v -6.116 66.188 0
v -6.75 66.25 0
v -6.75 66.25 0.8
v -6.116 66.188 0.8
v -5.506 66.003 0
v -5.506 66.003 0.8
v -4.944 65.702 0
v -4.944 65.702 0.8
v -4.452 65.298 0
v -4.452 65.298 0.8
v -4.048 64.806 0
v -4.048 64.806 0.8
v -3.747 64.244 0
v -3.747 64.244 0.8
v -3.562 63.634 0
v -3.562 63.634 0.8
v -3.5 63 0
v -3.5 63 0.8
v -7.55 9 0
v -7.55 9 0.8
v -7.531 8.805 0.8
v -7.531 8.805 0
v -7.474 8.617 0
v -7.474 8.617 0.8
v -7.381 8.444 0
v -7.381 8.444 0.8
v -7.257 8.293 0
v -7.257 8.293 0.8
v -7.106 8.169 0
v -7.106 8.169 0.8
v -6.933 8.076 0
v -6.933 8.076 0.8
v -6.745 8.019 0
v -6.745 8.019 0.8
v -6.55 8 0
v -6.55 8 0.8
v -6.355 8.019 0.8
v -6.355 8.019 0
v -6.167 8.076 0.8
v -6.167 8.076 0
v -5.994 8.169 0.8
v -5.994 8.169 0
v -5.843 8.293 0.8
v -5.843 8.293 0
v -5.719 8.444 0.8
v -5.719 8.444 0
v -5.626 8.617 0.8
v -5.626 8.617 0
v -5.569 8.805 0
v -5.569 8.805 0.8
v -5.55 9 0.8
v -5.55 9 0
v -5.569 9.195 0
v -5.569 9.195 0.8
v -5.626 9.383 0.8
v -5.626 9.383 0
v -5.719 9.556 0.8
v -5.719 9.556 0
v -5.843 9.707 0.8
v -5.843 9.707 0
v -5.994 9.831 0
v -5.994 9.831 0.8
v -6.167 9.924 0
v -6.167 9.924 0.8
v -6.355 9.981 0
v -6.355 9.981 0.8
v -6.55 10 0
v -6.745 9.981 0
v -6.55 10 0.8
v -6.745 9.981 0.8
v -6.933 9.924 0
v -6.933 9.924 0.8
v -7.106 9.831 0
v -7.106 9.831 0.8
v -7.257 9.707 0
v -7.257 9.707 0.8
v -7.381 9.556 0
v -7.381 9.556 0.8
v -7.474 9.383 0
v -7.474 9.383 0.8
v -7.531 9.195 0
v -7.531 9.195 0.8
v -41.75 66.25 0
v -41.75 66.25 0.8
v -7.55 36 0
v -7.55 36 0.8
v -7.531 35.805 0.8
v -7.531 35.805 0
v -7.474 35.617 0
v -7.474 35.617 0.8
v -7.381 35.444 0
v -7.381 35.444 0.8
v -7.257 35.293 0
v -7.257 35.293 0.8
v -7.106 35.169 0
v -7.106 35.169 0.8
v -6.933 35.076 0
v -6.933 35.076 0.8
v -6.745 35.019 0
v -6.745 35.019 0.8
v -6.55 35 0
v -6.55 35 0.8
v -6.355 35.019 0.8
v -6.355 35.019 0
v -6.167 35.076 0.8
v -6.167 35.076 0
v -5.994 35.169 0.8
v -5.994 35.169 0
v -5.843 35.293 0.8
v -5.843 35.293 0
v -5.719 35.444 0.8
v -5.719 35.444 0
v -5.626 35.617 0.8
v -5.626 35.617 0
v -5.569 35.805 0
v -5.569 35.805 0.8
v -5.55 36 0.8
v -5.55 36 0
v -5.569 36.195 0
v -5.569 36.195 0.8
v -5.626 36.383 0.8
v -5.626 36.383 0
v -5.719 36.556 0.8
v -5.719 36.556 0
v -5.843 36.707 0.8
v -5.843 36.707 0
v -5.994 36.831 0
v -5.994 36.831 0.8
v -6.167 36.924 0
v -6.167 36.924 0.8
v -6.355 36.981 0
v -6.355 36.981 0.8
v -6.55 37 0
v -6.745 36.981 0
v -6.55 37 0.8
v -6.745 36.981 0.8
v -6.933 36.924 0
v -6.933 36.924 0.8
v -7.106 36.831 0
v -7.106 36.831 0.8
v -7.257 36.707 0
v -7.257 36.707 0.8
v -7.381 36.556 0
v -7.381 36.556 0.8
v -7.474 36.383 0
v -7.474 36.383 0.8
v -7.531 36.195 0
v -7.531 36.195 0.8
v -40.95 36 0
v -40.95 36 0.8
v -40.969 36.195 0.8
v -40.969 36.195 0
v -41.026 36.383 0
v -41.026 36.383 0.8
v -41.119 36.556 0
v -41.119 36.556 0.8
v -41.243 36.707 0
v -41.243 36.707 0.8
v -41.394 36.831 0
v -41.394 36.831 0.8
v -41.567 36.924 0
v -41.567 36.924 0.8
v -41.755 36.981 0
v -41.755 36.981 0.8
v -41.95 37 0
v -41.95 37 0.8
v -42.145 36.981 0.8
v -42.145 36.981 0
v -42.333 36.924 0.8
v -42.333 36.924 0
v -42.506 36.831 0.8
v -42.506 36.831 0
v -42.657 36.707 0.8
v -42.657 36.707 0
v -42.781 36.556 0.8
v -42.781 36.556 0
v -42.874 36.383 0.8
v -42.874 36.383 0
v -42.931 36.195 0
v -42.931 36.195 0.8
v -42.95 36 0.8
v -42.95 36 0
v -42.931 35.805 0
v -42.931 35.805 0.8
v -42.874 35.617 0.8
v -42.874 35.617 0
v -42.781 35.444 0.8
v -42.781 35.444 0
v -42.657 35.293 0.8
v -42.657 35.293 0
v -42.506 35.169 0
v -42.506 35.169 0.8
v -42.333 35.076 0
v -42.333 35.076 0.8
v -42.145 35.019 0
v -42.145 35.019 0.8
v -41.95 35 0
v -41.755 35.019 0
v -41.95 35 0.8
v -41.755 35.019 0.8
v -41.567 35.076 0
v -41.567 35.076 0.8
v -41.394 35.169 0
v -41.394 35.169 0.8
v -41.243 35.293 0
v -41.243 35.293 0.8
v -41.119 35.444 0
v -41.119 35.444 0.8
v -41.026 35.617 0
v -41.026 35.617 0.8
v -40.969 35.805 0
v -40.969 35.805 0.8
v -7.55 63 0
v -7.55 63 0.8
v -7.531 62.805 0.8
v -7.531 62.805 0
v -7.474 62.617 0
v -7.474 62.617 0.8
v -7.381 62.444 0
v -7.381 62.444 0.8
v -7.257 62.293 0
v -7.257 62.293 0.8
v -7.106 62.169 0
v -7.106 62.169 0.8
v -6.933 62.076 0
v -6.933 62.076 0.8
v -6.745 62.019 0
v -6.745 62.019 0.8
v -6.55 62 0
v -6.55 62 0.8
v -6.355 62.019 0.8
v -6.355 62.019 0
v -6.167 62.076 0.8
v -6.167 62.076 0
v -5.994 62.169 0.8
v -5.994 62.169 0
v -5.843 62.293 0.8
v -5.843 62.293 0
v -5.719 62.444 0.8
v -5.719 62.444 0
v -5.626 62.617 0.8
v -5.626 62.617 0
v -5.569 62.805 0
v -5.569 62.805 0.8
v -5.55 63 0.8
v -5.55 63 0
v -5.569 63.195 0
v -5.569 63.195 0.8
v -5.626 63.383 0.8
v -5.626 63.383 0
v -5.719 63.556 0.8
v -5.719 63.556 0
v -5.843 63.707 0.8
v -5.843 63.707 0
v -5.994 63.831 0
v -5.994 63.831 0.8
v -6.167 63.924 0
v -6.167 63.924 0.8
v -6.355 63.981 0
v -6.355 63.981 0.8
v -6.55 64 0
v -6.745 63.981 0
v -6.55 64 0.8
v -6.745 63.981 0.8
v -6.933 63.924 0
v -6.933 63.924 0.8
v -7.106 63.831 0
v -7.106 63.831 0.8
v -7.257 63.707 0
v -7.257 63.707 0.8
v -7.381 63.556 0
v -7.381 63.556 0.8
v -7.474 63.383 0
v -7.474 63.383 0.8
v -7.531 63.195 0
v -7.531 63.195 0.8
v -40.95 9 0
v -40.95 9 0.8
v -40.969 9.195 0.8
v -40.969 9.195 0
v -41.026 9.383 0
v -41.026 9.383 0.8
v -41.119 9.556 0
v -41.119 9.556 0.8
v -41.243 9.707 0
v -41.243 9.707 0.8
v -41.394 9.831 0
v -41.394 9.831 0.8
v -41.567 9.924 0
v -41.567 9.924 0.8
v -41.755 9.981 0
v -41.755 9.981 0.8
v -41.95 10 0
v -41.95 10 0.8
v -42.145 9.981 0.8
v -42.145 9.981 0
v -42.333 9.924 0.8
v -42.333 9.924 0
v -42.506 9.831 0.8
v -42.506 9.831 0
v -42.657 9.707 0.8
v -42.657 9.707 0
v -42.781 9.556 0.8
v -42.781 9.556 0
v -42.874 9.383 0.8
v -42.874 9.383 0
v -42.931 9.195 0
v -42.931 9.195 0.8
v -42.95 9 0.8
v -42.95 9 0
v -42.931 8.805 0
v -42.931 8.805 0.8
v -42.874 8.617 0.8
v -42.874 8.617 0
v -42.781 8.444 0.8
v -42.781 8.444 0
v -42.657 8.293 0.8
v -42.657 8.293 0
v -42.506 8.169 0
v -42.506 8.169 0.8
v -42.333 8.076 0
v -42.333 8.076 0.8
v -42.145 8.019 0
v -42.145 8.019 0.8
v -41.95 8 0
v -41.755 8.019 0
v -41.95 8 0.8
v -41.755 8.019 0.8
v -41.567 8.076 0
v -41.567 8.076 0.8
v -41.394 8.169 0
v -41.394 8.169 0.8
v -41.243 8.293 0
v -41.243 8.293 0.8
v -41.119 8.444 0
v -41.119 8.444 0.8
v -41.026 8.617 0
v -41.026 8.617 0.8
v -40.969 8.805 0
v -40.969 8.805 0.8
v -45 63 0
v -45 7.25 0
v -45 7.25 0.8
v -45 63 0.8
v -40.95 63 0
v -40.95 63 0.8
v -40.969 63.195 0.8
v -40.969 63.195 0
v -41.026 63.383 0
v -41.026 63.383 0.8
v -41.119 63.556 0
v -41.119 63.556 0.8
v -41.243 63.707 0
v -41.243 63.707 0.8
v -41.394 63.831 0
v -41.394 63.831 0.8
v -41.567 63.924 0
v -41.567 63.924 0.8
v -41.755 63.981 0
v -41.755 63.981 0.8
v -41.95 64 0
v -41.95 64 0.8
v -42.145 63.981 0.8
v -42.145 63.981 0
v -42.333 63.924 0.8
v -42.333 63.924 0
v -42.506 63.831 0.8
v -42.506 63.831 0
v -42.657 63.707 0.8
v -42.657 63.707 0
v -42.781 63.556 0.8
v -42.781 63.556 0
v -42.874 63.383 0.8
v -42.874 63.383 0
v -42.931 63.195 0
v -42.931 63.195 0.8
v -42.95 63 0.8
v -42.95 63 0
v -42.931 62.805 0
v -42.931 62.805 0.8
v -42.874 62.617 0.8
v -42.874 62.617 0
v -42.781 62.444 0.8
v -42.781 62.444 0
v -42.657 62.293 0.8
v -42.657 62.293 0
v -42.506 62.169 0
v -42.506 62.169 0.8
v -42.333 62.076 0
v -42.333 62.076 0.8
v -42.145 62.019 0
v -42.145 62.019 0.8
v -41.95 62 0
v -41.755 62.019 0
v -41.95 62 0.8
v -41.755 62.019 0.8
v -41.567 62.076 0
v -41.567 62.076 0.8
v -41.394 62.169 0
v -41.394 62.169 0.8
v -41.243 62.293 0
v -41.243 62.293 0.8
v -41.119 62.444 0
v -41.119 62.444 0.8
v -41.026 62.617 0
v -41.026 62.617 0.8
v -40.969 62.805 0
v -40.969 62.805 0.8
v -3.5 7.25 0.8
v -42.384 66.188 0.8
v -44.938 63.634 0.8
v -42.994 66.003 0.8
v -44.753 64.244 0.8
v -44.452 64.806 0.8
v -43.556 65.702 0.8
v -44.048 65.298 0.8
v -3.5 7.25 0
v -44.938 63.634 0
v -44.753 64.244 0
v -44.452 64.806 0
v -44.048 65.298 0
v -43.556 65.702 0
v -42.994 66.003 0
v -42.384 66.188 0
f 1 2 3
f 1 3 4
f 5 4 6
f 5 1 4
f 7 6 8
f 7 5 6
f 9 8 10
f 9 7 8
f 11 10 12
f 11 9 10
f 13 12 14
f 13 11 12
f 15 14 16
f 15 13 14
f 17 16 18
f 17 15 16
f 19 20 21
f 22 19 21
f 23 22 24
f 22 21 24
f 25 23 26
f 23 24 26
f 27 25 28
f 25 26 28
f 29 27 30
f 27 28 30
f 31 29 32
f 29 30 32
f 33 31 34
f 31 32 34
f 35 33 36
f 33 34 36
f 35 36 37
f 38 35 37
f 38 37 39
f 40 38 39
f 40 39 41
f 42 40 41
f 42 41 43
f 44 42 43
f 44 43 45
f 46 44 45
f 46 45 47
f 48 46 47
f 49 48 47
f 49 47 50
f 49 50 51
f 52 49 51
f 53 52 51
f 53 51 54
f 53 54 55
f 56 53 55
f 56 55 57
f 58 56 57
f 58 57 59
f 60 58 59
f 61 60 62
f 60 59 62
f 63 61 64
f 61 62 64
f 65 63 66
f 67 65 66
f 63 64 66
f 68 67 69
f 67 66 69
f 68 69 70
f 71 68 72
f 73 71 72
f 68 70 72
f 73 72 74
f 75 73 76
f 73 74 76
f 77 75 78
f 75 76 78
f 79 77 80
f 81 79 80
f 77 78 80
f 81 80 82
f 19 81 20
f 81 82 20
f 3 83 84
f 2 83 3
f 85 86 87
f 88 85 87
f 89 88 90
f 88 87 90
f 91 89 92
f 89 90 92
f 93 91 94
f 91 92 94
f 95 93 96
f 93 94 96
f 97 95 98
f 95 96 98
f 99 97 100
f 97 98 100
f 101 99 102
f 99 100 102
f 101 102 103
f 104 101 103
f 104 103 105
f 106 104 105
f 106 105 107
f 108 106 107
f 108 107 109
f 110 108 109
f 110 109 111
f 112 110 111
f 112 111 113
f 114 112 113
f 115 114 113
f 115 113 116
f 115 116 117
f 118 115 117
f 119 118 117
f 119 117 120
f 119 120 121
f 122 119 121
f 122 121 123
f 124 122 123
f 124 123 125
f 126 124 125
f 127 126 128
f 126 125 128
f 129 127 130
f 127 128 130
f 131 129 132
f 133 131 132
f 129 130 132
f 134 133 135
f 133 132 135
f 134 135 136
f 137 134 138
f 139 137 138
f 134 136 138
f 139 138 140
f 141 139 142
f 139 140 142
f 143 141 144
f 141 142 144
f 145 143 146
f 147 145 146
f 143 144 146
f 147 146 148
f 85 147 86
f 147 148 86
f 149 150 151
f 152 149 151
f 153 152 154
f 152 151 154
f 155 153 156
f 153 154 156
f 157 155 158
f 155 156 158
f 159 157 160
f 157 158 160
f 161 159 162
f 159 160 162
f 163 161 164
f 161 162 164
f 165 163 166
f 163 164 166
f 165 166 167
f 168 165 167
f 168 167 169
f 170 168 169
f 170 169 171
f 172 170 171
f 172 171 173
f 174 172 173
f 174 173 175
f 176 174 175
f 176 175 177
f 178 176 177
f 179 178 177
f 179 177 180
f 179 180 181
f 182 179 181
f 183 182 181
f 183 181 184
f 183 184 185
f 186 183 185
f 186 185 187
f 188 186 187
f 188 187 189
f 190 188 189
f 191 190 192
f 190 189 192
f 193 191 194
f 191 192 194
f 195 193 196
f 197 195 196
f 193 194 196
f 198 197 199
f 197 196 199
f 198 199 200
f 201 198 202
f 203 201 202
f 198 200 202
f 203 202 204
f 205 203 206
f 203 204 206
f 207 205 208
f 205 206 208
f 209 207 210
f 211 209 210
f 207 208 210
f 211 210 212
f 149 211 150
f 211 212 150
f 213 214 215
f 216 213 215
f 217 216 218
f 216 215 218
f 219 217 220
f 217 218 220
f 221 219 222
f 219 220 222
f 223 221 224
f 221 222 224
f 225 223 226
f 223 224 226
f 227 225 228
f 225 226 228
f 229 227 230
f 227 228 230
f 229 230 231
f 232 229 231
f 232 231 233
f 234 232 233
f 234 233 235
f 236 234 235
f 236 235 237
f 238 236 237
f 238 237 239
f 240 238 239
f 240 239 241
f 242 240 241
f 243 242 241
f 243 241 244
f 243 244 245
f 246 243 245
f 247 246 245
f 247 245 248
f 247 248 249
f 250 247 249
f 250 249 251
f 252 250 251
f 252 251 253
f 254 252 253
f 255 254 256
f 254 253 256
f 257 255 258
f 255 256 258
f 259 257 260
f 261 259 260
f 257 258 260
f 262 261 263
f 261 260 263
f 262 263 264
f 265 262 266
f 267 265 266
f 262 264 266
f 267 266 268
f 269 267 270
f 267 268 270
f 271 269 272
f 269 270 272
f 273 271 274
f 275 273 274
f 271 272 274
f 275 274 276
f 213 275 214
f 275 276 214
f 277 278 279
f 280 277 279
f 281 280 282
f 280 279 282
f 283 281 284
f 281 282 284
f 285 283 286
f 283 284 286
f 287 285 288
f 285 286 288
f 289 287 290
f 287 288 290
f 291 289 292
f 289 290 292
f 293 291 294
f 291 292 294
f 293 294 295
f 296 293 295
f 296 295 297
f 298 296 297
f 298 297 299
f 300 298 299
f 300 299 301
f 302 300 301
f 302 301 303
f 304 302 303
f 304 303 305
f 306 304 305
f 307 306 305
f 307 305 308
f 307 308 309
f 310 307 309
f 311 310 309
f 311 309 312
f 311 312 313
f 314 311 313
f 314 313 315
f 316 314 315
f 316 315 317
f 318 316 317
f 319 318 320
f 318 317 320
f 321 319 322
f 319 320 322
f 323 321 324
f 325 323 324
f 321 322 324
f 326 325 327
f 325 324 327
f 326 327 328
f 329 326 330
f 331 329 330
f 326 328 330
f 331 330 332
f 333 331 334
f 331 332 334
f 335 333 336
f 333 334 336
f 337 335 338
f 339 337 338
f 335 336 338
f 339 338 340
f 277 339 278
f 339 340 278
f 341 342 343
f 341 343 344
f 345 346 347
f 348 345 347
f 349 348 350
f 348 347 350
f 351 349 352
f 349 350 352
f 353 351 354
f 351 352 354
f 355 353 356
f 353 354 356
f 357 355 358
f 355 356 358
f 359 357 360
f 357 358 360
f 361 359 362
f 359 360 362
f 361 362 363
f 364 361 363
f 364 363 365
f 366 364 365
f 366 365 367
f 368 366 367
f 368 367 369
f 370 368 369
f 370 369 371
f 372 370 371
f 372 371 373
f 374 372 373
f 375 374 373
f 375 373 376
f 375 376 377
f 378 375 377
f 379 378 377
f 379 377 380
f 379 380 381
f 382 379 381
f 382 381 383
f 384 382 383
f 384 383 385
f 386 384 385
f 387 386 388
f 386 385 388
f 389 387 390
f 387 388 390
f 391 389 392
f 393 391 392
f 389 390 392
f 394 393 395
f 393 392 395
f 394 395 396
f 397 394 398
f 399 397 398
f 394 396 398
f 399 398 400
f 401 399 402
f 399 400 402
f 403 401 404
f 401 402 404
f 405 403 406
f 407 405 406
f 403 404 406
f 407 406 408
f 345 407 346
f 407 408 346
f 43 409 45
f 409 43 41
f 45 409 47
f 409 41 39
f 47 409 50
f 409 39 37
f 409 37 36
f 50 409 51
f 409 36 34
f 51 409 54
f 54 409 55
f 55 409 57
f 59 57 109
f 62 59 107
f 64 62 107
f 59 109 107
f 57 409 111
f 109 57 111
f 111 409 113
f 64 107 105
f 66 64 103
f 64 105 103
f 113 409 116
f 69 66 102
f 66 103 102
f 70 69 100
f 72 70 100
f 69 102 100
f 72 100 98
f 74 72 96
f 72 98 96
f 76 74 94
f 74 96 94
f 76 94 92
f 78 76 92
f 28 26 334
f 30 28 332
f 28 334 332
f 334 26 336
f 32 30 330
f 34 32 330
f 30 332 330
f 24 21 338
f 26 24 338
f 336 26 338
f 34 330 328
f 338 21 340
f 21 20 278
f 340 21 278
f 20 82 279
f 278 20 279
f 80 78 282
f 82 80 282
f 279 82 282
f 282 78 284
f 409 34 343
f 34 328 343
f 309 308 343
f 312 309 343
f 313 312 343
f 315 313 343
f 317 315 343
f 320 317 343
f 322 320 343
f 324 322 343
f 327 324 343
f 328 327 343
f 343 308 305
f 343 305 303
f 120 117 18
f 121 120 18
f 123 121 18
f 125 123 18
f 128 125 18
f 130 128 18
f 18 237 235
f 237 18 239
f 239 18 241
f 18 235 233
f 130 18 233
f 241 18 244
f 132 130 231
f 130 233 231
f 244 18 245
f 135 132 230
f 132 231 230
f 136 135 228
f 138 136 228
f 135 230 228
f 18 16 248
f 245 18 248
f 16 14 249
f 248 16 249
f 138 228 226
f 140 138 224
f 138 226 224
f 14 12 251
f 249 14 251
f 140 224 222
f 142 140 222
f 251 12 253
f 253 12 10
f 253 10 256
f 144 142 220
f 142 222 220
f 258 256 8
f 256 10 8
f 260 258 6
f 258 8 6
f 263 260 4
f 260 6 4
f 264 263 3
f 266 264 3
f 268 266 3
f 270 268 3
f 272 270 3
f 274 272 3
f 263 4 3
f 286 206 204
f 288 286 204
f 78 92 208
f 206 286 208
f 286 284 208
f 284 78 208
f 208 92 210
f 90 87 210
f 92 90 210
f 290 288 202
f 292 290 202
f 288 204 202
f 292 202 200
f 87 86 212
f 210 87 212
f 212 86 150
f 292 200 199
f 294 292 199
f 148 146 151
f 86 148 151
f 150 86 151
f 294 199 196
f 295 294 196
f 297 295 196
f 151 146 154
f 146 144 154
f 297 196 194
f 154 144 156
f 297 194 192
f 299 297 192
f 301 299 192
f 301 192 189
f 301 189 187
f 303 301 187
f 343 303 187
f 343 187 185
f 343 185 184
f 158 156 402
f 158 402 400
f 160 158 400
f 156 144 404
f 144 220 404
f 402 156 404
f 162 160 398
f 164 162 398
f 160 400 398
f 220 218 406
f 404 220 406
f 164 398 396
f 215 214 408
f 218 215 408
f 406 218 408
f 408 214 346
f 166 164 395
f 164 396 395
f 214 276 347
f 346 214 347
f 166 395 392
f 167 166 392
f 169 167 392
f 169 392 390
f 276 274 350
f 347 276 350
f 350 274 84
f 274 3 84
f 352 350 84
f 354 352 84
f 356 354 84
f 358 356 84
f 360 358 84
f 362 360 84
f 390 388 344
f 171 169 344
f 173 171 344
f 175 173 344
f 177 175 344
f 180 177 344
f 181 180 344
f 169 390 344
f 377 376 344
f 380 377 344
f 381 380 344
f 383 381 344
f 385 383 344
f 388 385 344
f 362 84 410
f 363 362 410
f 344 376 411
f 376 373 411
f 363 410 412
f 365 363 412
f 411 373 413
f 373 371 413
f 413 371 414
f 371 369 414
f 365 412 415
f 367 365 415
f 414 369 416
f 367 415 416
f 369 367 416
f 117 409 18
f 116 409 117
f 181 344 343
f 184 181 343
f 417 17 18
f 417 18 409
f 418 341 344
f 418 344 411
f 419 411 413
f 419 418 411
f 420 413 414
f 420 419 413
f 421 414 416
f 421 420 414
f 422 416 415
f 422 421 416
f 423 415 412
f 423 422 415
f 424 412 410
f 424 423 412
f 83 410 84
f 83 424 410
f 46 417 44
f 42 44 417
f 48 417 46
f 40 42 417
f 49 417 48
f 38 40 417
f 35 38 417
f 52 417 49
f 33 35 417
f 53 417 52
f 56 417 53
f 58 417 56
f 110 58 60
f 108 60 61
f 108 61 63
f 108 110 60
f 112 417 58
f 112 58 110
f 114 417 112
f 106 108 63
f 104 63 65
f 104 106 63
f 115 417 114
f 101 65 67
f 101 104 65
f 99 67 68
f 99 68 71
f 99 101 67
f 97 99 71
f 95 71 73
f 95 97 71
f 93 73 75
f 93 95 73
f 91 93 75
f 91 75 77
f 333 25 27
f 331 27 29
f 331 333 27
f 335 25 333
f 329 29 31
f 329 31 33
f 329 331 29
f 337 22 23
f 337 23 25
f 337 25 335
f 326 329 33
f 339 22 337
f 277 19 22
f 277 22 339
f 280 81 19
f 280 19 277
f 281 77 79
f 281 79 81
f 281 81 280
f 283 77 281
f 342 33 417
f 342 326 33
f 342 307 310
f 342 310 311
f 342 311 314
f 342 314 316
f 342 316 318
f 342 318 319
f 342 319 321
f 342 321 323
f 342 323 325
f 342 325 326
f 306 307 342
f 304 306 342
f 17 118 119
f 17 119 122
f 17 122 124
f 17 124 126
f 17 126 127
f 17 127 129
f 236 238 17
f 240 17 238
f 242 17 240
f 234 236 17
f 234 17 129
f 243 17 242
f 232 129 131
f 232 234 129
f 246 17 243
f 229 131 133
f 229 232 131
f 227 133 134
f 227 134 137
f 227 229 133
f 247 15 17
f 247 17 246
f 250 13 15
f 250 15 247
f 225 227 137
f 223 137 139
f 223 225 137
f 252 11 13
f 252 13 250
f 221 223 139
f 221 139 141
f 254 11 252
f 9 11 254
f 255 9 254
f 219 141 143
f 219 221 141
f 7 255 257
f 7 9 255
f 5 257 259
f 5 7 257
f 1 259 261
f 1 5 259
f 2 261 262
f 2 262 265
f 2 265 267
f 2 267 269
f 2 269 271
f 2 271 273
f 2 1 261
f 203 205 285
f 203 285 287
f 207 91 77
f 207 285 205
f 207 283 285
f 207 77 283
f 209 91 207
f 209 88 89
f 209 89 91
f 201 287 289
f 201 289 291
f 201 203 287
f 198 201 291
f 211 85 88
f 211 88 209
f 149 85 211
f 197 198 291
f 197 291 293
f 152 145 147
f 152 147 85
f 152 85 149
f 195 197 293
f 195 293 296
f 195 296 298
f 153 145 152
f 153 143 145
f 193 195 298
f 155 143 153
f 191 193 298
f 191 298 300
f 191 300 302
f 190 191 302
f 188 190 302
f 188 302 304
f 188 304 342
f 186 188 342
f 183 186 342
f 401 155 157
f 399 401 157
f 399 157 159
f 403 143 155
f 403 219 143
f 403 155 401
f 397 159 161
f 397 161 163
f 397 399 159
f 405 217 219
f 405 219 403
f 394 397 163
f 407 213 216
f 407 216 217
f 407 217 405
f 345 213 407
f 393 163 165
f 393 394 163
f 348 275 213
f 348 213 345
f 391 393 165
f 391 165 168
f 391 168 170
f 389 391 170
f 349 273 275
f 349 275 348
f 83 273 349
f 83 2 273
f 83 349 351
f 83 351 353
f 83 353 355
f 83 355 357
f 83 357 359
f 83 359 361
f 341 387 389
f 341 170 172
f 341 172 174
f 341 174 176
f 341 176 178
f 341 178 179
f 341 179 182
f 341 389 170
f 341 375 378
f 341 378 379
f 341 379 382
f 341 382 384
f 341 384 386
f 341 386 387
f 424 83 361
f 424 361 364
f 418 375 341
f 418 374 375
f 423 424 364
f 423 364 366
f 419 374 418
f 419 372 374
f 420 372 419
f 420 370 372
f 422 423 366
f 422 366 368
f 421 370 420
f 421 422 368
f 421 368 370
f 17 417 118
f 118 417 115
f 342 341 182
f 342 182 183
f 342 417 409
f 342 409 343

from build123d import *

# Parameters (mm, degrees)
EXTRUDE_1_DEPTH     = 0.8
SKETCH_2_R          = 1
CUT_EXTRUDE_1_DEPTH = 81.091837911


with BuildPart() as part:
    # 草图1 → 凸台-拉伸1 (new body)
    with BuildSketch(Plane.XY):
        with BuildLine():
            Line((-41.75, 66.25), (-6.75, 66.25))
            ThreePointArc((-6.75, 66.25), (-4.451902961, 65.298097039), (-3.5, 63))
            Line((-3.5, 63), (-3.5, 7.25))
            Line((-3.5, 7.25), (-45, 7.25))
            Line((-45, 7.25), (-45, 63))
            ThreePointArc((-45, 63), (-44.048097039, 65.298097039), (-41.75, 66.25))
        make_face()
    extrude(amount=EXTRUDE_1_DEPTH)

    # 草图2 → 切除-拉伸1 (cut, through all)
    with BuildSketch(Plane.XY.offset(0.8)):
        with Locations((-41.95, 63)):
            Circle(SKETCH_2_R)
        with Locations((-41.95, 36)):
            Circle(SKETCH_2_R)
        with Locations((-41.95, 9)):
            Circle(SKETCH_2_R)
        with Locations(Location((-6.55, 9, 0), (0, 0, 180))):
            Circle(SKETCH_2_R)
        with Locations(Location((-6.55, 36, 0), (0, 0, 180))):
            Circle(SKETCH_2_R)
        with Locations(Location((-6.55, 63, 0), (0, 0, 180))):
            Circle(SKETCH_2_R)
    extrude(amount=-CUT_EXTRUDE_1_DEPTH, mode=Mode.SUBTRACT)


solid = part.part
